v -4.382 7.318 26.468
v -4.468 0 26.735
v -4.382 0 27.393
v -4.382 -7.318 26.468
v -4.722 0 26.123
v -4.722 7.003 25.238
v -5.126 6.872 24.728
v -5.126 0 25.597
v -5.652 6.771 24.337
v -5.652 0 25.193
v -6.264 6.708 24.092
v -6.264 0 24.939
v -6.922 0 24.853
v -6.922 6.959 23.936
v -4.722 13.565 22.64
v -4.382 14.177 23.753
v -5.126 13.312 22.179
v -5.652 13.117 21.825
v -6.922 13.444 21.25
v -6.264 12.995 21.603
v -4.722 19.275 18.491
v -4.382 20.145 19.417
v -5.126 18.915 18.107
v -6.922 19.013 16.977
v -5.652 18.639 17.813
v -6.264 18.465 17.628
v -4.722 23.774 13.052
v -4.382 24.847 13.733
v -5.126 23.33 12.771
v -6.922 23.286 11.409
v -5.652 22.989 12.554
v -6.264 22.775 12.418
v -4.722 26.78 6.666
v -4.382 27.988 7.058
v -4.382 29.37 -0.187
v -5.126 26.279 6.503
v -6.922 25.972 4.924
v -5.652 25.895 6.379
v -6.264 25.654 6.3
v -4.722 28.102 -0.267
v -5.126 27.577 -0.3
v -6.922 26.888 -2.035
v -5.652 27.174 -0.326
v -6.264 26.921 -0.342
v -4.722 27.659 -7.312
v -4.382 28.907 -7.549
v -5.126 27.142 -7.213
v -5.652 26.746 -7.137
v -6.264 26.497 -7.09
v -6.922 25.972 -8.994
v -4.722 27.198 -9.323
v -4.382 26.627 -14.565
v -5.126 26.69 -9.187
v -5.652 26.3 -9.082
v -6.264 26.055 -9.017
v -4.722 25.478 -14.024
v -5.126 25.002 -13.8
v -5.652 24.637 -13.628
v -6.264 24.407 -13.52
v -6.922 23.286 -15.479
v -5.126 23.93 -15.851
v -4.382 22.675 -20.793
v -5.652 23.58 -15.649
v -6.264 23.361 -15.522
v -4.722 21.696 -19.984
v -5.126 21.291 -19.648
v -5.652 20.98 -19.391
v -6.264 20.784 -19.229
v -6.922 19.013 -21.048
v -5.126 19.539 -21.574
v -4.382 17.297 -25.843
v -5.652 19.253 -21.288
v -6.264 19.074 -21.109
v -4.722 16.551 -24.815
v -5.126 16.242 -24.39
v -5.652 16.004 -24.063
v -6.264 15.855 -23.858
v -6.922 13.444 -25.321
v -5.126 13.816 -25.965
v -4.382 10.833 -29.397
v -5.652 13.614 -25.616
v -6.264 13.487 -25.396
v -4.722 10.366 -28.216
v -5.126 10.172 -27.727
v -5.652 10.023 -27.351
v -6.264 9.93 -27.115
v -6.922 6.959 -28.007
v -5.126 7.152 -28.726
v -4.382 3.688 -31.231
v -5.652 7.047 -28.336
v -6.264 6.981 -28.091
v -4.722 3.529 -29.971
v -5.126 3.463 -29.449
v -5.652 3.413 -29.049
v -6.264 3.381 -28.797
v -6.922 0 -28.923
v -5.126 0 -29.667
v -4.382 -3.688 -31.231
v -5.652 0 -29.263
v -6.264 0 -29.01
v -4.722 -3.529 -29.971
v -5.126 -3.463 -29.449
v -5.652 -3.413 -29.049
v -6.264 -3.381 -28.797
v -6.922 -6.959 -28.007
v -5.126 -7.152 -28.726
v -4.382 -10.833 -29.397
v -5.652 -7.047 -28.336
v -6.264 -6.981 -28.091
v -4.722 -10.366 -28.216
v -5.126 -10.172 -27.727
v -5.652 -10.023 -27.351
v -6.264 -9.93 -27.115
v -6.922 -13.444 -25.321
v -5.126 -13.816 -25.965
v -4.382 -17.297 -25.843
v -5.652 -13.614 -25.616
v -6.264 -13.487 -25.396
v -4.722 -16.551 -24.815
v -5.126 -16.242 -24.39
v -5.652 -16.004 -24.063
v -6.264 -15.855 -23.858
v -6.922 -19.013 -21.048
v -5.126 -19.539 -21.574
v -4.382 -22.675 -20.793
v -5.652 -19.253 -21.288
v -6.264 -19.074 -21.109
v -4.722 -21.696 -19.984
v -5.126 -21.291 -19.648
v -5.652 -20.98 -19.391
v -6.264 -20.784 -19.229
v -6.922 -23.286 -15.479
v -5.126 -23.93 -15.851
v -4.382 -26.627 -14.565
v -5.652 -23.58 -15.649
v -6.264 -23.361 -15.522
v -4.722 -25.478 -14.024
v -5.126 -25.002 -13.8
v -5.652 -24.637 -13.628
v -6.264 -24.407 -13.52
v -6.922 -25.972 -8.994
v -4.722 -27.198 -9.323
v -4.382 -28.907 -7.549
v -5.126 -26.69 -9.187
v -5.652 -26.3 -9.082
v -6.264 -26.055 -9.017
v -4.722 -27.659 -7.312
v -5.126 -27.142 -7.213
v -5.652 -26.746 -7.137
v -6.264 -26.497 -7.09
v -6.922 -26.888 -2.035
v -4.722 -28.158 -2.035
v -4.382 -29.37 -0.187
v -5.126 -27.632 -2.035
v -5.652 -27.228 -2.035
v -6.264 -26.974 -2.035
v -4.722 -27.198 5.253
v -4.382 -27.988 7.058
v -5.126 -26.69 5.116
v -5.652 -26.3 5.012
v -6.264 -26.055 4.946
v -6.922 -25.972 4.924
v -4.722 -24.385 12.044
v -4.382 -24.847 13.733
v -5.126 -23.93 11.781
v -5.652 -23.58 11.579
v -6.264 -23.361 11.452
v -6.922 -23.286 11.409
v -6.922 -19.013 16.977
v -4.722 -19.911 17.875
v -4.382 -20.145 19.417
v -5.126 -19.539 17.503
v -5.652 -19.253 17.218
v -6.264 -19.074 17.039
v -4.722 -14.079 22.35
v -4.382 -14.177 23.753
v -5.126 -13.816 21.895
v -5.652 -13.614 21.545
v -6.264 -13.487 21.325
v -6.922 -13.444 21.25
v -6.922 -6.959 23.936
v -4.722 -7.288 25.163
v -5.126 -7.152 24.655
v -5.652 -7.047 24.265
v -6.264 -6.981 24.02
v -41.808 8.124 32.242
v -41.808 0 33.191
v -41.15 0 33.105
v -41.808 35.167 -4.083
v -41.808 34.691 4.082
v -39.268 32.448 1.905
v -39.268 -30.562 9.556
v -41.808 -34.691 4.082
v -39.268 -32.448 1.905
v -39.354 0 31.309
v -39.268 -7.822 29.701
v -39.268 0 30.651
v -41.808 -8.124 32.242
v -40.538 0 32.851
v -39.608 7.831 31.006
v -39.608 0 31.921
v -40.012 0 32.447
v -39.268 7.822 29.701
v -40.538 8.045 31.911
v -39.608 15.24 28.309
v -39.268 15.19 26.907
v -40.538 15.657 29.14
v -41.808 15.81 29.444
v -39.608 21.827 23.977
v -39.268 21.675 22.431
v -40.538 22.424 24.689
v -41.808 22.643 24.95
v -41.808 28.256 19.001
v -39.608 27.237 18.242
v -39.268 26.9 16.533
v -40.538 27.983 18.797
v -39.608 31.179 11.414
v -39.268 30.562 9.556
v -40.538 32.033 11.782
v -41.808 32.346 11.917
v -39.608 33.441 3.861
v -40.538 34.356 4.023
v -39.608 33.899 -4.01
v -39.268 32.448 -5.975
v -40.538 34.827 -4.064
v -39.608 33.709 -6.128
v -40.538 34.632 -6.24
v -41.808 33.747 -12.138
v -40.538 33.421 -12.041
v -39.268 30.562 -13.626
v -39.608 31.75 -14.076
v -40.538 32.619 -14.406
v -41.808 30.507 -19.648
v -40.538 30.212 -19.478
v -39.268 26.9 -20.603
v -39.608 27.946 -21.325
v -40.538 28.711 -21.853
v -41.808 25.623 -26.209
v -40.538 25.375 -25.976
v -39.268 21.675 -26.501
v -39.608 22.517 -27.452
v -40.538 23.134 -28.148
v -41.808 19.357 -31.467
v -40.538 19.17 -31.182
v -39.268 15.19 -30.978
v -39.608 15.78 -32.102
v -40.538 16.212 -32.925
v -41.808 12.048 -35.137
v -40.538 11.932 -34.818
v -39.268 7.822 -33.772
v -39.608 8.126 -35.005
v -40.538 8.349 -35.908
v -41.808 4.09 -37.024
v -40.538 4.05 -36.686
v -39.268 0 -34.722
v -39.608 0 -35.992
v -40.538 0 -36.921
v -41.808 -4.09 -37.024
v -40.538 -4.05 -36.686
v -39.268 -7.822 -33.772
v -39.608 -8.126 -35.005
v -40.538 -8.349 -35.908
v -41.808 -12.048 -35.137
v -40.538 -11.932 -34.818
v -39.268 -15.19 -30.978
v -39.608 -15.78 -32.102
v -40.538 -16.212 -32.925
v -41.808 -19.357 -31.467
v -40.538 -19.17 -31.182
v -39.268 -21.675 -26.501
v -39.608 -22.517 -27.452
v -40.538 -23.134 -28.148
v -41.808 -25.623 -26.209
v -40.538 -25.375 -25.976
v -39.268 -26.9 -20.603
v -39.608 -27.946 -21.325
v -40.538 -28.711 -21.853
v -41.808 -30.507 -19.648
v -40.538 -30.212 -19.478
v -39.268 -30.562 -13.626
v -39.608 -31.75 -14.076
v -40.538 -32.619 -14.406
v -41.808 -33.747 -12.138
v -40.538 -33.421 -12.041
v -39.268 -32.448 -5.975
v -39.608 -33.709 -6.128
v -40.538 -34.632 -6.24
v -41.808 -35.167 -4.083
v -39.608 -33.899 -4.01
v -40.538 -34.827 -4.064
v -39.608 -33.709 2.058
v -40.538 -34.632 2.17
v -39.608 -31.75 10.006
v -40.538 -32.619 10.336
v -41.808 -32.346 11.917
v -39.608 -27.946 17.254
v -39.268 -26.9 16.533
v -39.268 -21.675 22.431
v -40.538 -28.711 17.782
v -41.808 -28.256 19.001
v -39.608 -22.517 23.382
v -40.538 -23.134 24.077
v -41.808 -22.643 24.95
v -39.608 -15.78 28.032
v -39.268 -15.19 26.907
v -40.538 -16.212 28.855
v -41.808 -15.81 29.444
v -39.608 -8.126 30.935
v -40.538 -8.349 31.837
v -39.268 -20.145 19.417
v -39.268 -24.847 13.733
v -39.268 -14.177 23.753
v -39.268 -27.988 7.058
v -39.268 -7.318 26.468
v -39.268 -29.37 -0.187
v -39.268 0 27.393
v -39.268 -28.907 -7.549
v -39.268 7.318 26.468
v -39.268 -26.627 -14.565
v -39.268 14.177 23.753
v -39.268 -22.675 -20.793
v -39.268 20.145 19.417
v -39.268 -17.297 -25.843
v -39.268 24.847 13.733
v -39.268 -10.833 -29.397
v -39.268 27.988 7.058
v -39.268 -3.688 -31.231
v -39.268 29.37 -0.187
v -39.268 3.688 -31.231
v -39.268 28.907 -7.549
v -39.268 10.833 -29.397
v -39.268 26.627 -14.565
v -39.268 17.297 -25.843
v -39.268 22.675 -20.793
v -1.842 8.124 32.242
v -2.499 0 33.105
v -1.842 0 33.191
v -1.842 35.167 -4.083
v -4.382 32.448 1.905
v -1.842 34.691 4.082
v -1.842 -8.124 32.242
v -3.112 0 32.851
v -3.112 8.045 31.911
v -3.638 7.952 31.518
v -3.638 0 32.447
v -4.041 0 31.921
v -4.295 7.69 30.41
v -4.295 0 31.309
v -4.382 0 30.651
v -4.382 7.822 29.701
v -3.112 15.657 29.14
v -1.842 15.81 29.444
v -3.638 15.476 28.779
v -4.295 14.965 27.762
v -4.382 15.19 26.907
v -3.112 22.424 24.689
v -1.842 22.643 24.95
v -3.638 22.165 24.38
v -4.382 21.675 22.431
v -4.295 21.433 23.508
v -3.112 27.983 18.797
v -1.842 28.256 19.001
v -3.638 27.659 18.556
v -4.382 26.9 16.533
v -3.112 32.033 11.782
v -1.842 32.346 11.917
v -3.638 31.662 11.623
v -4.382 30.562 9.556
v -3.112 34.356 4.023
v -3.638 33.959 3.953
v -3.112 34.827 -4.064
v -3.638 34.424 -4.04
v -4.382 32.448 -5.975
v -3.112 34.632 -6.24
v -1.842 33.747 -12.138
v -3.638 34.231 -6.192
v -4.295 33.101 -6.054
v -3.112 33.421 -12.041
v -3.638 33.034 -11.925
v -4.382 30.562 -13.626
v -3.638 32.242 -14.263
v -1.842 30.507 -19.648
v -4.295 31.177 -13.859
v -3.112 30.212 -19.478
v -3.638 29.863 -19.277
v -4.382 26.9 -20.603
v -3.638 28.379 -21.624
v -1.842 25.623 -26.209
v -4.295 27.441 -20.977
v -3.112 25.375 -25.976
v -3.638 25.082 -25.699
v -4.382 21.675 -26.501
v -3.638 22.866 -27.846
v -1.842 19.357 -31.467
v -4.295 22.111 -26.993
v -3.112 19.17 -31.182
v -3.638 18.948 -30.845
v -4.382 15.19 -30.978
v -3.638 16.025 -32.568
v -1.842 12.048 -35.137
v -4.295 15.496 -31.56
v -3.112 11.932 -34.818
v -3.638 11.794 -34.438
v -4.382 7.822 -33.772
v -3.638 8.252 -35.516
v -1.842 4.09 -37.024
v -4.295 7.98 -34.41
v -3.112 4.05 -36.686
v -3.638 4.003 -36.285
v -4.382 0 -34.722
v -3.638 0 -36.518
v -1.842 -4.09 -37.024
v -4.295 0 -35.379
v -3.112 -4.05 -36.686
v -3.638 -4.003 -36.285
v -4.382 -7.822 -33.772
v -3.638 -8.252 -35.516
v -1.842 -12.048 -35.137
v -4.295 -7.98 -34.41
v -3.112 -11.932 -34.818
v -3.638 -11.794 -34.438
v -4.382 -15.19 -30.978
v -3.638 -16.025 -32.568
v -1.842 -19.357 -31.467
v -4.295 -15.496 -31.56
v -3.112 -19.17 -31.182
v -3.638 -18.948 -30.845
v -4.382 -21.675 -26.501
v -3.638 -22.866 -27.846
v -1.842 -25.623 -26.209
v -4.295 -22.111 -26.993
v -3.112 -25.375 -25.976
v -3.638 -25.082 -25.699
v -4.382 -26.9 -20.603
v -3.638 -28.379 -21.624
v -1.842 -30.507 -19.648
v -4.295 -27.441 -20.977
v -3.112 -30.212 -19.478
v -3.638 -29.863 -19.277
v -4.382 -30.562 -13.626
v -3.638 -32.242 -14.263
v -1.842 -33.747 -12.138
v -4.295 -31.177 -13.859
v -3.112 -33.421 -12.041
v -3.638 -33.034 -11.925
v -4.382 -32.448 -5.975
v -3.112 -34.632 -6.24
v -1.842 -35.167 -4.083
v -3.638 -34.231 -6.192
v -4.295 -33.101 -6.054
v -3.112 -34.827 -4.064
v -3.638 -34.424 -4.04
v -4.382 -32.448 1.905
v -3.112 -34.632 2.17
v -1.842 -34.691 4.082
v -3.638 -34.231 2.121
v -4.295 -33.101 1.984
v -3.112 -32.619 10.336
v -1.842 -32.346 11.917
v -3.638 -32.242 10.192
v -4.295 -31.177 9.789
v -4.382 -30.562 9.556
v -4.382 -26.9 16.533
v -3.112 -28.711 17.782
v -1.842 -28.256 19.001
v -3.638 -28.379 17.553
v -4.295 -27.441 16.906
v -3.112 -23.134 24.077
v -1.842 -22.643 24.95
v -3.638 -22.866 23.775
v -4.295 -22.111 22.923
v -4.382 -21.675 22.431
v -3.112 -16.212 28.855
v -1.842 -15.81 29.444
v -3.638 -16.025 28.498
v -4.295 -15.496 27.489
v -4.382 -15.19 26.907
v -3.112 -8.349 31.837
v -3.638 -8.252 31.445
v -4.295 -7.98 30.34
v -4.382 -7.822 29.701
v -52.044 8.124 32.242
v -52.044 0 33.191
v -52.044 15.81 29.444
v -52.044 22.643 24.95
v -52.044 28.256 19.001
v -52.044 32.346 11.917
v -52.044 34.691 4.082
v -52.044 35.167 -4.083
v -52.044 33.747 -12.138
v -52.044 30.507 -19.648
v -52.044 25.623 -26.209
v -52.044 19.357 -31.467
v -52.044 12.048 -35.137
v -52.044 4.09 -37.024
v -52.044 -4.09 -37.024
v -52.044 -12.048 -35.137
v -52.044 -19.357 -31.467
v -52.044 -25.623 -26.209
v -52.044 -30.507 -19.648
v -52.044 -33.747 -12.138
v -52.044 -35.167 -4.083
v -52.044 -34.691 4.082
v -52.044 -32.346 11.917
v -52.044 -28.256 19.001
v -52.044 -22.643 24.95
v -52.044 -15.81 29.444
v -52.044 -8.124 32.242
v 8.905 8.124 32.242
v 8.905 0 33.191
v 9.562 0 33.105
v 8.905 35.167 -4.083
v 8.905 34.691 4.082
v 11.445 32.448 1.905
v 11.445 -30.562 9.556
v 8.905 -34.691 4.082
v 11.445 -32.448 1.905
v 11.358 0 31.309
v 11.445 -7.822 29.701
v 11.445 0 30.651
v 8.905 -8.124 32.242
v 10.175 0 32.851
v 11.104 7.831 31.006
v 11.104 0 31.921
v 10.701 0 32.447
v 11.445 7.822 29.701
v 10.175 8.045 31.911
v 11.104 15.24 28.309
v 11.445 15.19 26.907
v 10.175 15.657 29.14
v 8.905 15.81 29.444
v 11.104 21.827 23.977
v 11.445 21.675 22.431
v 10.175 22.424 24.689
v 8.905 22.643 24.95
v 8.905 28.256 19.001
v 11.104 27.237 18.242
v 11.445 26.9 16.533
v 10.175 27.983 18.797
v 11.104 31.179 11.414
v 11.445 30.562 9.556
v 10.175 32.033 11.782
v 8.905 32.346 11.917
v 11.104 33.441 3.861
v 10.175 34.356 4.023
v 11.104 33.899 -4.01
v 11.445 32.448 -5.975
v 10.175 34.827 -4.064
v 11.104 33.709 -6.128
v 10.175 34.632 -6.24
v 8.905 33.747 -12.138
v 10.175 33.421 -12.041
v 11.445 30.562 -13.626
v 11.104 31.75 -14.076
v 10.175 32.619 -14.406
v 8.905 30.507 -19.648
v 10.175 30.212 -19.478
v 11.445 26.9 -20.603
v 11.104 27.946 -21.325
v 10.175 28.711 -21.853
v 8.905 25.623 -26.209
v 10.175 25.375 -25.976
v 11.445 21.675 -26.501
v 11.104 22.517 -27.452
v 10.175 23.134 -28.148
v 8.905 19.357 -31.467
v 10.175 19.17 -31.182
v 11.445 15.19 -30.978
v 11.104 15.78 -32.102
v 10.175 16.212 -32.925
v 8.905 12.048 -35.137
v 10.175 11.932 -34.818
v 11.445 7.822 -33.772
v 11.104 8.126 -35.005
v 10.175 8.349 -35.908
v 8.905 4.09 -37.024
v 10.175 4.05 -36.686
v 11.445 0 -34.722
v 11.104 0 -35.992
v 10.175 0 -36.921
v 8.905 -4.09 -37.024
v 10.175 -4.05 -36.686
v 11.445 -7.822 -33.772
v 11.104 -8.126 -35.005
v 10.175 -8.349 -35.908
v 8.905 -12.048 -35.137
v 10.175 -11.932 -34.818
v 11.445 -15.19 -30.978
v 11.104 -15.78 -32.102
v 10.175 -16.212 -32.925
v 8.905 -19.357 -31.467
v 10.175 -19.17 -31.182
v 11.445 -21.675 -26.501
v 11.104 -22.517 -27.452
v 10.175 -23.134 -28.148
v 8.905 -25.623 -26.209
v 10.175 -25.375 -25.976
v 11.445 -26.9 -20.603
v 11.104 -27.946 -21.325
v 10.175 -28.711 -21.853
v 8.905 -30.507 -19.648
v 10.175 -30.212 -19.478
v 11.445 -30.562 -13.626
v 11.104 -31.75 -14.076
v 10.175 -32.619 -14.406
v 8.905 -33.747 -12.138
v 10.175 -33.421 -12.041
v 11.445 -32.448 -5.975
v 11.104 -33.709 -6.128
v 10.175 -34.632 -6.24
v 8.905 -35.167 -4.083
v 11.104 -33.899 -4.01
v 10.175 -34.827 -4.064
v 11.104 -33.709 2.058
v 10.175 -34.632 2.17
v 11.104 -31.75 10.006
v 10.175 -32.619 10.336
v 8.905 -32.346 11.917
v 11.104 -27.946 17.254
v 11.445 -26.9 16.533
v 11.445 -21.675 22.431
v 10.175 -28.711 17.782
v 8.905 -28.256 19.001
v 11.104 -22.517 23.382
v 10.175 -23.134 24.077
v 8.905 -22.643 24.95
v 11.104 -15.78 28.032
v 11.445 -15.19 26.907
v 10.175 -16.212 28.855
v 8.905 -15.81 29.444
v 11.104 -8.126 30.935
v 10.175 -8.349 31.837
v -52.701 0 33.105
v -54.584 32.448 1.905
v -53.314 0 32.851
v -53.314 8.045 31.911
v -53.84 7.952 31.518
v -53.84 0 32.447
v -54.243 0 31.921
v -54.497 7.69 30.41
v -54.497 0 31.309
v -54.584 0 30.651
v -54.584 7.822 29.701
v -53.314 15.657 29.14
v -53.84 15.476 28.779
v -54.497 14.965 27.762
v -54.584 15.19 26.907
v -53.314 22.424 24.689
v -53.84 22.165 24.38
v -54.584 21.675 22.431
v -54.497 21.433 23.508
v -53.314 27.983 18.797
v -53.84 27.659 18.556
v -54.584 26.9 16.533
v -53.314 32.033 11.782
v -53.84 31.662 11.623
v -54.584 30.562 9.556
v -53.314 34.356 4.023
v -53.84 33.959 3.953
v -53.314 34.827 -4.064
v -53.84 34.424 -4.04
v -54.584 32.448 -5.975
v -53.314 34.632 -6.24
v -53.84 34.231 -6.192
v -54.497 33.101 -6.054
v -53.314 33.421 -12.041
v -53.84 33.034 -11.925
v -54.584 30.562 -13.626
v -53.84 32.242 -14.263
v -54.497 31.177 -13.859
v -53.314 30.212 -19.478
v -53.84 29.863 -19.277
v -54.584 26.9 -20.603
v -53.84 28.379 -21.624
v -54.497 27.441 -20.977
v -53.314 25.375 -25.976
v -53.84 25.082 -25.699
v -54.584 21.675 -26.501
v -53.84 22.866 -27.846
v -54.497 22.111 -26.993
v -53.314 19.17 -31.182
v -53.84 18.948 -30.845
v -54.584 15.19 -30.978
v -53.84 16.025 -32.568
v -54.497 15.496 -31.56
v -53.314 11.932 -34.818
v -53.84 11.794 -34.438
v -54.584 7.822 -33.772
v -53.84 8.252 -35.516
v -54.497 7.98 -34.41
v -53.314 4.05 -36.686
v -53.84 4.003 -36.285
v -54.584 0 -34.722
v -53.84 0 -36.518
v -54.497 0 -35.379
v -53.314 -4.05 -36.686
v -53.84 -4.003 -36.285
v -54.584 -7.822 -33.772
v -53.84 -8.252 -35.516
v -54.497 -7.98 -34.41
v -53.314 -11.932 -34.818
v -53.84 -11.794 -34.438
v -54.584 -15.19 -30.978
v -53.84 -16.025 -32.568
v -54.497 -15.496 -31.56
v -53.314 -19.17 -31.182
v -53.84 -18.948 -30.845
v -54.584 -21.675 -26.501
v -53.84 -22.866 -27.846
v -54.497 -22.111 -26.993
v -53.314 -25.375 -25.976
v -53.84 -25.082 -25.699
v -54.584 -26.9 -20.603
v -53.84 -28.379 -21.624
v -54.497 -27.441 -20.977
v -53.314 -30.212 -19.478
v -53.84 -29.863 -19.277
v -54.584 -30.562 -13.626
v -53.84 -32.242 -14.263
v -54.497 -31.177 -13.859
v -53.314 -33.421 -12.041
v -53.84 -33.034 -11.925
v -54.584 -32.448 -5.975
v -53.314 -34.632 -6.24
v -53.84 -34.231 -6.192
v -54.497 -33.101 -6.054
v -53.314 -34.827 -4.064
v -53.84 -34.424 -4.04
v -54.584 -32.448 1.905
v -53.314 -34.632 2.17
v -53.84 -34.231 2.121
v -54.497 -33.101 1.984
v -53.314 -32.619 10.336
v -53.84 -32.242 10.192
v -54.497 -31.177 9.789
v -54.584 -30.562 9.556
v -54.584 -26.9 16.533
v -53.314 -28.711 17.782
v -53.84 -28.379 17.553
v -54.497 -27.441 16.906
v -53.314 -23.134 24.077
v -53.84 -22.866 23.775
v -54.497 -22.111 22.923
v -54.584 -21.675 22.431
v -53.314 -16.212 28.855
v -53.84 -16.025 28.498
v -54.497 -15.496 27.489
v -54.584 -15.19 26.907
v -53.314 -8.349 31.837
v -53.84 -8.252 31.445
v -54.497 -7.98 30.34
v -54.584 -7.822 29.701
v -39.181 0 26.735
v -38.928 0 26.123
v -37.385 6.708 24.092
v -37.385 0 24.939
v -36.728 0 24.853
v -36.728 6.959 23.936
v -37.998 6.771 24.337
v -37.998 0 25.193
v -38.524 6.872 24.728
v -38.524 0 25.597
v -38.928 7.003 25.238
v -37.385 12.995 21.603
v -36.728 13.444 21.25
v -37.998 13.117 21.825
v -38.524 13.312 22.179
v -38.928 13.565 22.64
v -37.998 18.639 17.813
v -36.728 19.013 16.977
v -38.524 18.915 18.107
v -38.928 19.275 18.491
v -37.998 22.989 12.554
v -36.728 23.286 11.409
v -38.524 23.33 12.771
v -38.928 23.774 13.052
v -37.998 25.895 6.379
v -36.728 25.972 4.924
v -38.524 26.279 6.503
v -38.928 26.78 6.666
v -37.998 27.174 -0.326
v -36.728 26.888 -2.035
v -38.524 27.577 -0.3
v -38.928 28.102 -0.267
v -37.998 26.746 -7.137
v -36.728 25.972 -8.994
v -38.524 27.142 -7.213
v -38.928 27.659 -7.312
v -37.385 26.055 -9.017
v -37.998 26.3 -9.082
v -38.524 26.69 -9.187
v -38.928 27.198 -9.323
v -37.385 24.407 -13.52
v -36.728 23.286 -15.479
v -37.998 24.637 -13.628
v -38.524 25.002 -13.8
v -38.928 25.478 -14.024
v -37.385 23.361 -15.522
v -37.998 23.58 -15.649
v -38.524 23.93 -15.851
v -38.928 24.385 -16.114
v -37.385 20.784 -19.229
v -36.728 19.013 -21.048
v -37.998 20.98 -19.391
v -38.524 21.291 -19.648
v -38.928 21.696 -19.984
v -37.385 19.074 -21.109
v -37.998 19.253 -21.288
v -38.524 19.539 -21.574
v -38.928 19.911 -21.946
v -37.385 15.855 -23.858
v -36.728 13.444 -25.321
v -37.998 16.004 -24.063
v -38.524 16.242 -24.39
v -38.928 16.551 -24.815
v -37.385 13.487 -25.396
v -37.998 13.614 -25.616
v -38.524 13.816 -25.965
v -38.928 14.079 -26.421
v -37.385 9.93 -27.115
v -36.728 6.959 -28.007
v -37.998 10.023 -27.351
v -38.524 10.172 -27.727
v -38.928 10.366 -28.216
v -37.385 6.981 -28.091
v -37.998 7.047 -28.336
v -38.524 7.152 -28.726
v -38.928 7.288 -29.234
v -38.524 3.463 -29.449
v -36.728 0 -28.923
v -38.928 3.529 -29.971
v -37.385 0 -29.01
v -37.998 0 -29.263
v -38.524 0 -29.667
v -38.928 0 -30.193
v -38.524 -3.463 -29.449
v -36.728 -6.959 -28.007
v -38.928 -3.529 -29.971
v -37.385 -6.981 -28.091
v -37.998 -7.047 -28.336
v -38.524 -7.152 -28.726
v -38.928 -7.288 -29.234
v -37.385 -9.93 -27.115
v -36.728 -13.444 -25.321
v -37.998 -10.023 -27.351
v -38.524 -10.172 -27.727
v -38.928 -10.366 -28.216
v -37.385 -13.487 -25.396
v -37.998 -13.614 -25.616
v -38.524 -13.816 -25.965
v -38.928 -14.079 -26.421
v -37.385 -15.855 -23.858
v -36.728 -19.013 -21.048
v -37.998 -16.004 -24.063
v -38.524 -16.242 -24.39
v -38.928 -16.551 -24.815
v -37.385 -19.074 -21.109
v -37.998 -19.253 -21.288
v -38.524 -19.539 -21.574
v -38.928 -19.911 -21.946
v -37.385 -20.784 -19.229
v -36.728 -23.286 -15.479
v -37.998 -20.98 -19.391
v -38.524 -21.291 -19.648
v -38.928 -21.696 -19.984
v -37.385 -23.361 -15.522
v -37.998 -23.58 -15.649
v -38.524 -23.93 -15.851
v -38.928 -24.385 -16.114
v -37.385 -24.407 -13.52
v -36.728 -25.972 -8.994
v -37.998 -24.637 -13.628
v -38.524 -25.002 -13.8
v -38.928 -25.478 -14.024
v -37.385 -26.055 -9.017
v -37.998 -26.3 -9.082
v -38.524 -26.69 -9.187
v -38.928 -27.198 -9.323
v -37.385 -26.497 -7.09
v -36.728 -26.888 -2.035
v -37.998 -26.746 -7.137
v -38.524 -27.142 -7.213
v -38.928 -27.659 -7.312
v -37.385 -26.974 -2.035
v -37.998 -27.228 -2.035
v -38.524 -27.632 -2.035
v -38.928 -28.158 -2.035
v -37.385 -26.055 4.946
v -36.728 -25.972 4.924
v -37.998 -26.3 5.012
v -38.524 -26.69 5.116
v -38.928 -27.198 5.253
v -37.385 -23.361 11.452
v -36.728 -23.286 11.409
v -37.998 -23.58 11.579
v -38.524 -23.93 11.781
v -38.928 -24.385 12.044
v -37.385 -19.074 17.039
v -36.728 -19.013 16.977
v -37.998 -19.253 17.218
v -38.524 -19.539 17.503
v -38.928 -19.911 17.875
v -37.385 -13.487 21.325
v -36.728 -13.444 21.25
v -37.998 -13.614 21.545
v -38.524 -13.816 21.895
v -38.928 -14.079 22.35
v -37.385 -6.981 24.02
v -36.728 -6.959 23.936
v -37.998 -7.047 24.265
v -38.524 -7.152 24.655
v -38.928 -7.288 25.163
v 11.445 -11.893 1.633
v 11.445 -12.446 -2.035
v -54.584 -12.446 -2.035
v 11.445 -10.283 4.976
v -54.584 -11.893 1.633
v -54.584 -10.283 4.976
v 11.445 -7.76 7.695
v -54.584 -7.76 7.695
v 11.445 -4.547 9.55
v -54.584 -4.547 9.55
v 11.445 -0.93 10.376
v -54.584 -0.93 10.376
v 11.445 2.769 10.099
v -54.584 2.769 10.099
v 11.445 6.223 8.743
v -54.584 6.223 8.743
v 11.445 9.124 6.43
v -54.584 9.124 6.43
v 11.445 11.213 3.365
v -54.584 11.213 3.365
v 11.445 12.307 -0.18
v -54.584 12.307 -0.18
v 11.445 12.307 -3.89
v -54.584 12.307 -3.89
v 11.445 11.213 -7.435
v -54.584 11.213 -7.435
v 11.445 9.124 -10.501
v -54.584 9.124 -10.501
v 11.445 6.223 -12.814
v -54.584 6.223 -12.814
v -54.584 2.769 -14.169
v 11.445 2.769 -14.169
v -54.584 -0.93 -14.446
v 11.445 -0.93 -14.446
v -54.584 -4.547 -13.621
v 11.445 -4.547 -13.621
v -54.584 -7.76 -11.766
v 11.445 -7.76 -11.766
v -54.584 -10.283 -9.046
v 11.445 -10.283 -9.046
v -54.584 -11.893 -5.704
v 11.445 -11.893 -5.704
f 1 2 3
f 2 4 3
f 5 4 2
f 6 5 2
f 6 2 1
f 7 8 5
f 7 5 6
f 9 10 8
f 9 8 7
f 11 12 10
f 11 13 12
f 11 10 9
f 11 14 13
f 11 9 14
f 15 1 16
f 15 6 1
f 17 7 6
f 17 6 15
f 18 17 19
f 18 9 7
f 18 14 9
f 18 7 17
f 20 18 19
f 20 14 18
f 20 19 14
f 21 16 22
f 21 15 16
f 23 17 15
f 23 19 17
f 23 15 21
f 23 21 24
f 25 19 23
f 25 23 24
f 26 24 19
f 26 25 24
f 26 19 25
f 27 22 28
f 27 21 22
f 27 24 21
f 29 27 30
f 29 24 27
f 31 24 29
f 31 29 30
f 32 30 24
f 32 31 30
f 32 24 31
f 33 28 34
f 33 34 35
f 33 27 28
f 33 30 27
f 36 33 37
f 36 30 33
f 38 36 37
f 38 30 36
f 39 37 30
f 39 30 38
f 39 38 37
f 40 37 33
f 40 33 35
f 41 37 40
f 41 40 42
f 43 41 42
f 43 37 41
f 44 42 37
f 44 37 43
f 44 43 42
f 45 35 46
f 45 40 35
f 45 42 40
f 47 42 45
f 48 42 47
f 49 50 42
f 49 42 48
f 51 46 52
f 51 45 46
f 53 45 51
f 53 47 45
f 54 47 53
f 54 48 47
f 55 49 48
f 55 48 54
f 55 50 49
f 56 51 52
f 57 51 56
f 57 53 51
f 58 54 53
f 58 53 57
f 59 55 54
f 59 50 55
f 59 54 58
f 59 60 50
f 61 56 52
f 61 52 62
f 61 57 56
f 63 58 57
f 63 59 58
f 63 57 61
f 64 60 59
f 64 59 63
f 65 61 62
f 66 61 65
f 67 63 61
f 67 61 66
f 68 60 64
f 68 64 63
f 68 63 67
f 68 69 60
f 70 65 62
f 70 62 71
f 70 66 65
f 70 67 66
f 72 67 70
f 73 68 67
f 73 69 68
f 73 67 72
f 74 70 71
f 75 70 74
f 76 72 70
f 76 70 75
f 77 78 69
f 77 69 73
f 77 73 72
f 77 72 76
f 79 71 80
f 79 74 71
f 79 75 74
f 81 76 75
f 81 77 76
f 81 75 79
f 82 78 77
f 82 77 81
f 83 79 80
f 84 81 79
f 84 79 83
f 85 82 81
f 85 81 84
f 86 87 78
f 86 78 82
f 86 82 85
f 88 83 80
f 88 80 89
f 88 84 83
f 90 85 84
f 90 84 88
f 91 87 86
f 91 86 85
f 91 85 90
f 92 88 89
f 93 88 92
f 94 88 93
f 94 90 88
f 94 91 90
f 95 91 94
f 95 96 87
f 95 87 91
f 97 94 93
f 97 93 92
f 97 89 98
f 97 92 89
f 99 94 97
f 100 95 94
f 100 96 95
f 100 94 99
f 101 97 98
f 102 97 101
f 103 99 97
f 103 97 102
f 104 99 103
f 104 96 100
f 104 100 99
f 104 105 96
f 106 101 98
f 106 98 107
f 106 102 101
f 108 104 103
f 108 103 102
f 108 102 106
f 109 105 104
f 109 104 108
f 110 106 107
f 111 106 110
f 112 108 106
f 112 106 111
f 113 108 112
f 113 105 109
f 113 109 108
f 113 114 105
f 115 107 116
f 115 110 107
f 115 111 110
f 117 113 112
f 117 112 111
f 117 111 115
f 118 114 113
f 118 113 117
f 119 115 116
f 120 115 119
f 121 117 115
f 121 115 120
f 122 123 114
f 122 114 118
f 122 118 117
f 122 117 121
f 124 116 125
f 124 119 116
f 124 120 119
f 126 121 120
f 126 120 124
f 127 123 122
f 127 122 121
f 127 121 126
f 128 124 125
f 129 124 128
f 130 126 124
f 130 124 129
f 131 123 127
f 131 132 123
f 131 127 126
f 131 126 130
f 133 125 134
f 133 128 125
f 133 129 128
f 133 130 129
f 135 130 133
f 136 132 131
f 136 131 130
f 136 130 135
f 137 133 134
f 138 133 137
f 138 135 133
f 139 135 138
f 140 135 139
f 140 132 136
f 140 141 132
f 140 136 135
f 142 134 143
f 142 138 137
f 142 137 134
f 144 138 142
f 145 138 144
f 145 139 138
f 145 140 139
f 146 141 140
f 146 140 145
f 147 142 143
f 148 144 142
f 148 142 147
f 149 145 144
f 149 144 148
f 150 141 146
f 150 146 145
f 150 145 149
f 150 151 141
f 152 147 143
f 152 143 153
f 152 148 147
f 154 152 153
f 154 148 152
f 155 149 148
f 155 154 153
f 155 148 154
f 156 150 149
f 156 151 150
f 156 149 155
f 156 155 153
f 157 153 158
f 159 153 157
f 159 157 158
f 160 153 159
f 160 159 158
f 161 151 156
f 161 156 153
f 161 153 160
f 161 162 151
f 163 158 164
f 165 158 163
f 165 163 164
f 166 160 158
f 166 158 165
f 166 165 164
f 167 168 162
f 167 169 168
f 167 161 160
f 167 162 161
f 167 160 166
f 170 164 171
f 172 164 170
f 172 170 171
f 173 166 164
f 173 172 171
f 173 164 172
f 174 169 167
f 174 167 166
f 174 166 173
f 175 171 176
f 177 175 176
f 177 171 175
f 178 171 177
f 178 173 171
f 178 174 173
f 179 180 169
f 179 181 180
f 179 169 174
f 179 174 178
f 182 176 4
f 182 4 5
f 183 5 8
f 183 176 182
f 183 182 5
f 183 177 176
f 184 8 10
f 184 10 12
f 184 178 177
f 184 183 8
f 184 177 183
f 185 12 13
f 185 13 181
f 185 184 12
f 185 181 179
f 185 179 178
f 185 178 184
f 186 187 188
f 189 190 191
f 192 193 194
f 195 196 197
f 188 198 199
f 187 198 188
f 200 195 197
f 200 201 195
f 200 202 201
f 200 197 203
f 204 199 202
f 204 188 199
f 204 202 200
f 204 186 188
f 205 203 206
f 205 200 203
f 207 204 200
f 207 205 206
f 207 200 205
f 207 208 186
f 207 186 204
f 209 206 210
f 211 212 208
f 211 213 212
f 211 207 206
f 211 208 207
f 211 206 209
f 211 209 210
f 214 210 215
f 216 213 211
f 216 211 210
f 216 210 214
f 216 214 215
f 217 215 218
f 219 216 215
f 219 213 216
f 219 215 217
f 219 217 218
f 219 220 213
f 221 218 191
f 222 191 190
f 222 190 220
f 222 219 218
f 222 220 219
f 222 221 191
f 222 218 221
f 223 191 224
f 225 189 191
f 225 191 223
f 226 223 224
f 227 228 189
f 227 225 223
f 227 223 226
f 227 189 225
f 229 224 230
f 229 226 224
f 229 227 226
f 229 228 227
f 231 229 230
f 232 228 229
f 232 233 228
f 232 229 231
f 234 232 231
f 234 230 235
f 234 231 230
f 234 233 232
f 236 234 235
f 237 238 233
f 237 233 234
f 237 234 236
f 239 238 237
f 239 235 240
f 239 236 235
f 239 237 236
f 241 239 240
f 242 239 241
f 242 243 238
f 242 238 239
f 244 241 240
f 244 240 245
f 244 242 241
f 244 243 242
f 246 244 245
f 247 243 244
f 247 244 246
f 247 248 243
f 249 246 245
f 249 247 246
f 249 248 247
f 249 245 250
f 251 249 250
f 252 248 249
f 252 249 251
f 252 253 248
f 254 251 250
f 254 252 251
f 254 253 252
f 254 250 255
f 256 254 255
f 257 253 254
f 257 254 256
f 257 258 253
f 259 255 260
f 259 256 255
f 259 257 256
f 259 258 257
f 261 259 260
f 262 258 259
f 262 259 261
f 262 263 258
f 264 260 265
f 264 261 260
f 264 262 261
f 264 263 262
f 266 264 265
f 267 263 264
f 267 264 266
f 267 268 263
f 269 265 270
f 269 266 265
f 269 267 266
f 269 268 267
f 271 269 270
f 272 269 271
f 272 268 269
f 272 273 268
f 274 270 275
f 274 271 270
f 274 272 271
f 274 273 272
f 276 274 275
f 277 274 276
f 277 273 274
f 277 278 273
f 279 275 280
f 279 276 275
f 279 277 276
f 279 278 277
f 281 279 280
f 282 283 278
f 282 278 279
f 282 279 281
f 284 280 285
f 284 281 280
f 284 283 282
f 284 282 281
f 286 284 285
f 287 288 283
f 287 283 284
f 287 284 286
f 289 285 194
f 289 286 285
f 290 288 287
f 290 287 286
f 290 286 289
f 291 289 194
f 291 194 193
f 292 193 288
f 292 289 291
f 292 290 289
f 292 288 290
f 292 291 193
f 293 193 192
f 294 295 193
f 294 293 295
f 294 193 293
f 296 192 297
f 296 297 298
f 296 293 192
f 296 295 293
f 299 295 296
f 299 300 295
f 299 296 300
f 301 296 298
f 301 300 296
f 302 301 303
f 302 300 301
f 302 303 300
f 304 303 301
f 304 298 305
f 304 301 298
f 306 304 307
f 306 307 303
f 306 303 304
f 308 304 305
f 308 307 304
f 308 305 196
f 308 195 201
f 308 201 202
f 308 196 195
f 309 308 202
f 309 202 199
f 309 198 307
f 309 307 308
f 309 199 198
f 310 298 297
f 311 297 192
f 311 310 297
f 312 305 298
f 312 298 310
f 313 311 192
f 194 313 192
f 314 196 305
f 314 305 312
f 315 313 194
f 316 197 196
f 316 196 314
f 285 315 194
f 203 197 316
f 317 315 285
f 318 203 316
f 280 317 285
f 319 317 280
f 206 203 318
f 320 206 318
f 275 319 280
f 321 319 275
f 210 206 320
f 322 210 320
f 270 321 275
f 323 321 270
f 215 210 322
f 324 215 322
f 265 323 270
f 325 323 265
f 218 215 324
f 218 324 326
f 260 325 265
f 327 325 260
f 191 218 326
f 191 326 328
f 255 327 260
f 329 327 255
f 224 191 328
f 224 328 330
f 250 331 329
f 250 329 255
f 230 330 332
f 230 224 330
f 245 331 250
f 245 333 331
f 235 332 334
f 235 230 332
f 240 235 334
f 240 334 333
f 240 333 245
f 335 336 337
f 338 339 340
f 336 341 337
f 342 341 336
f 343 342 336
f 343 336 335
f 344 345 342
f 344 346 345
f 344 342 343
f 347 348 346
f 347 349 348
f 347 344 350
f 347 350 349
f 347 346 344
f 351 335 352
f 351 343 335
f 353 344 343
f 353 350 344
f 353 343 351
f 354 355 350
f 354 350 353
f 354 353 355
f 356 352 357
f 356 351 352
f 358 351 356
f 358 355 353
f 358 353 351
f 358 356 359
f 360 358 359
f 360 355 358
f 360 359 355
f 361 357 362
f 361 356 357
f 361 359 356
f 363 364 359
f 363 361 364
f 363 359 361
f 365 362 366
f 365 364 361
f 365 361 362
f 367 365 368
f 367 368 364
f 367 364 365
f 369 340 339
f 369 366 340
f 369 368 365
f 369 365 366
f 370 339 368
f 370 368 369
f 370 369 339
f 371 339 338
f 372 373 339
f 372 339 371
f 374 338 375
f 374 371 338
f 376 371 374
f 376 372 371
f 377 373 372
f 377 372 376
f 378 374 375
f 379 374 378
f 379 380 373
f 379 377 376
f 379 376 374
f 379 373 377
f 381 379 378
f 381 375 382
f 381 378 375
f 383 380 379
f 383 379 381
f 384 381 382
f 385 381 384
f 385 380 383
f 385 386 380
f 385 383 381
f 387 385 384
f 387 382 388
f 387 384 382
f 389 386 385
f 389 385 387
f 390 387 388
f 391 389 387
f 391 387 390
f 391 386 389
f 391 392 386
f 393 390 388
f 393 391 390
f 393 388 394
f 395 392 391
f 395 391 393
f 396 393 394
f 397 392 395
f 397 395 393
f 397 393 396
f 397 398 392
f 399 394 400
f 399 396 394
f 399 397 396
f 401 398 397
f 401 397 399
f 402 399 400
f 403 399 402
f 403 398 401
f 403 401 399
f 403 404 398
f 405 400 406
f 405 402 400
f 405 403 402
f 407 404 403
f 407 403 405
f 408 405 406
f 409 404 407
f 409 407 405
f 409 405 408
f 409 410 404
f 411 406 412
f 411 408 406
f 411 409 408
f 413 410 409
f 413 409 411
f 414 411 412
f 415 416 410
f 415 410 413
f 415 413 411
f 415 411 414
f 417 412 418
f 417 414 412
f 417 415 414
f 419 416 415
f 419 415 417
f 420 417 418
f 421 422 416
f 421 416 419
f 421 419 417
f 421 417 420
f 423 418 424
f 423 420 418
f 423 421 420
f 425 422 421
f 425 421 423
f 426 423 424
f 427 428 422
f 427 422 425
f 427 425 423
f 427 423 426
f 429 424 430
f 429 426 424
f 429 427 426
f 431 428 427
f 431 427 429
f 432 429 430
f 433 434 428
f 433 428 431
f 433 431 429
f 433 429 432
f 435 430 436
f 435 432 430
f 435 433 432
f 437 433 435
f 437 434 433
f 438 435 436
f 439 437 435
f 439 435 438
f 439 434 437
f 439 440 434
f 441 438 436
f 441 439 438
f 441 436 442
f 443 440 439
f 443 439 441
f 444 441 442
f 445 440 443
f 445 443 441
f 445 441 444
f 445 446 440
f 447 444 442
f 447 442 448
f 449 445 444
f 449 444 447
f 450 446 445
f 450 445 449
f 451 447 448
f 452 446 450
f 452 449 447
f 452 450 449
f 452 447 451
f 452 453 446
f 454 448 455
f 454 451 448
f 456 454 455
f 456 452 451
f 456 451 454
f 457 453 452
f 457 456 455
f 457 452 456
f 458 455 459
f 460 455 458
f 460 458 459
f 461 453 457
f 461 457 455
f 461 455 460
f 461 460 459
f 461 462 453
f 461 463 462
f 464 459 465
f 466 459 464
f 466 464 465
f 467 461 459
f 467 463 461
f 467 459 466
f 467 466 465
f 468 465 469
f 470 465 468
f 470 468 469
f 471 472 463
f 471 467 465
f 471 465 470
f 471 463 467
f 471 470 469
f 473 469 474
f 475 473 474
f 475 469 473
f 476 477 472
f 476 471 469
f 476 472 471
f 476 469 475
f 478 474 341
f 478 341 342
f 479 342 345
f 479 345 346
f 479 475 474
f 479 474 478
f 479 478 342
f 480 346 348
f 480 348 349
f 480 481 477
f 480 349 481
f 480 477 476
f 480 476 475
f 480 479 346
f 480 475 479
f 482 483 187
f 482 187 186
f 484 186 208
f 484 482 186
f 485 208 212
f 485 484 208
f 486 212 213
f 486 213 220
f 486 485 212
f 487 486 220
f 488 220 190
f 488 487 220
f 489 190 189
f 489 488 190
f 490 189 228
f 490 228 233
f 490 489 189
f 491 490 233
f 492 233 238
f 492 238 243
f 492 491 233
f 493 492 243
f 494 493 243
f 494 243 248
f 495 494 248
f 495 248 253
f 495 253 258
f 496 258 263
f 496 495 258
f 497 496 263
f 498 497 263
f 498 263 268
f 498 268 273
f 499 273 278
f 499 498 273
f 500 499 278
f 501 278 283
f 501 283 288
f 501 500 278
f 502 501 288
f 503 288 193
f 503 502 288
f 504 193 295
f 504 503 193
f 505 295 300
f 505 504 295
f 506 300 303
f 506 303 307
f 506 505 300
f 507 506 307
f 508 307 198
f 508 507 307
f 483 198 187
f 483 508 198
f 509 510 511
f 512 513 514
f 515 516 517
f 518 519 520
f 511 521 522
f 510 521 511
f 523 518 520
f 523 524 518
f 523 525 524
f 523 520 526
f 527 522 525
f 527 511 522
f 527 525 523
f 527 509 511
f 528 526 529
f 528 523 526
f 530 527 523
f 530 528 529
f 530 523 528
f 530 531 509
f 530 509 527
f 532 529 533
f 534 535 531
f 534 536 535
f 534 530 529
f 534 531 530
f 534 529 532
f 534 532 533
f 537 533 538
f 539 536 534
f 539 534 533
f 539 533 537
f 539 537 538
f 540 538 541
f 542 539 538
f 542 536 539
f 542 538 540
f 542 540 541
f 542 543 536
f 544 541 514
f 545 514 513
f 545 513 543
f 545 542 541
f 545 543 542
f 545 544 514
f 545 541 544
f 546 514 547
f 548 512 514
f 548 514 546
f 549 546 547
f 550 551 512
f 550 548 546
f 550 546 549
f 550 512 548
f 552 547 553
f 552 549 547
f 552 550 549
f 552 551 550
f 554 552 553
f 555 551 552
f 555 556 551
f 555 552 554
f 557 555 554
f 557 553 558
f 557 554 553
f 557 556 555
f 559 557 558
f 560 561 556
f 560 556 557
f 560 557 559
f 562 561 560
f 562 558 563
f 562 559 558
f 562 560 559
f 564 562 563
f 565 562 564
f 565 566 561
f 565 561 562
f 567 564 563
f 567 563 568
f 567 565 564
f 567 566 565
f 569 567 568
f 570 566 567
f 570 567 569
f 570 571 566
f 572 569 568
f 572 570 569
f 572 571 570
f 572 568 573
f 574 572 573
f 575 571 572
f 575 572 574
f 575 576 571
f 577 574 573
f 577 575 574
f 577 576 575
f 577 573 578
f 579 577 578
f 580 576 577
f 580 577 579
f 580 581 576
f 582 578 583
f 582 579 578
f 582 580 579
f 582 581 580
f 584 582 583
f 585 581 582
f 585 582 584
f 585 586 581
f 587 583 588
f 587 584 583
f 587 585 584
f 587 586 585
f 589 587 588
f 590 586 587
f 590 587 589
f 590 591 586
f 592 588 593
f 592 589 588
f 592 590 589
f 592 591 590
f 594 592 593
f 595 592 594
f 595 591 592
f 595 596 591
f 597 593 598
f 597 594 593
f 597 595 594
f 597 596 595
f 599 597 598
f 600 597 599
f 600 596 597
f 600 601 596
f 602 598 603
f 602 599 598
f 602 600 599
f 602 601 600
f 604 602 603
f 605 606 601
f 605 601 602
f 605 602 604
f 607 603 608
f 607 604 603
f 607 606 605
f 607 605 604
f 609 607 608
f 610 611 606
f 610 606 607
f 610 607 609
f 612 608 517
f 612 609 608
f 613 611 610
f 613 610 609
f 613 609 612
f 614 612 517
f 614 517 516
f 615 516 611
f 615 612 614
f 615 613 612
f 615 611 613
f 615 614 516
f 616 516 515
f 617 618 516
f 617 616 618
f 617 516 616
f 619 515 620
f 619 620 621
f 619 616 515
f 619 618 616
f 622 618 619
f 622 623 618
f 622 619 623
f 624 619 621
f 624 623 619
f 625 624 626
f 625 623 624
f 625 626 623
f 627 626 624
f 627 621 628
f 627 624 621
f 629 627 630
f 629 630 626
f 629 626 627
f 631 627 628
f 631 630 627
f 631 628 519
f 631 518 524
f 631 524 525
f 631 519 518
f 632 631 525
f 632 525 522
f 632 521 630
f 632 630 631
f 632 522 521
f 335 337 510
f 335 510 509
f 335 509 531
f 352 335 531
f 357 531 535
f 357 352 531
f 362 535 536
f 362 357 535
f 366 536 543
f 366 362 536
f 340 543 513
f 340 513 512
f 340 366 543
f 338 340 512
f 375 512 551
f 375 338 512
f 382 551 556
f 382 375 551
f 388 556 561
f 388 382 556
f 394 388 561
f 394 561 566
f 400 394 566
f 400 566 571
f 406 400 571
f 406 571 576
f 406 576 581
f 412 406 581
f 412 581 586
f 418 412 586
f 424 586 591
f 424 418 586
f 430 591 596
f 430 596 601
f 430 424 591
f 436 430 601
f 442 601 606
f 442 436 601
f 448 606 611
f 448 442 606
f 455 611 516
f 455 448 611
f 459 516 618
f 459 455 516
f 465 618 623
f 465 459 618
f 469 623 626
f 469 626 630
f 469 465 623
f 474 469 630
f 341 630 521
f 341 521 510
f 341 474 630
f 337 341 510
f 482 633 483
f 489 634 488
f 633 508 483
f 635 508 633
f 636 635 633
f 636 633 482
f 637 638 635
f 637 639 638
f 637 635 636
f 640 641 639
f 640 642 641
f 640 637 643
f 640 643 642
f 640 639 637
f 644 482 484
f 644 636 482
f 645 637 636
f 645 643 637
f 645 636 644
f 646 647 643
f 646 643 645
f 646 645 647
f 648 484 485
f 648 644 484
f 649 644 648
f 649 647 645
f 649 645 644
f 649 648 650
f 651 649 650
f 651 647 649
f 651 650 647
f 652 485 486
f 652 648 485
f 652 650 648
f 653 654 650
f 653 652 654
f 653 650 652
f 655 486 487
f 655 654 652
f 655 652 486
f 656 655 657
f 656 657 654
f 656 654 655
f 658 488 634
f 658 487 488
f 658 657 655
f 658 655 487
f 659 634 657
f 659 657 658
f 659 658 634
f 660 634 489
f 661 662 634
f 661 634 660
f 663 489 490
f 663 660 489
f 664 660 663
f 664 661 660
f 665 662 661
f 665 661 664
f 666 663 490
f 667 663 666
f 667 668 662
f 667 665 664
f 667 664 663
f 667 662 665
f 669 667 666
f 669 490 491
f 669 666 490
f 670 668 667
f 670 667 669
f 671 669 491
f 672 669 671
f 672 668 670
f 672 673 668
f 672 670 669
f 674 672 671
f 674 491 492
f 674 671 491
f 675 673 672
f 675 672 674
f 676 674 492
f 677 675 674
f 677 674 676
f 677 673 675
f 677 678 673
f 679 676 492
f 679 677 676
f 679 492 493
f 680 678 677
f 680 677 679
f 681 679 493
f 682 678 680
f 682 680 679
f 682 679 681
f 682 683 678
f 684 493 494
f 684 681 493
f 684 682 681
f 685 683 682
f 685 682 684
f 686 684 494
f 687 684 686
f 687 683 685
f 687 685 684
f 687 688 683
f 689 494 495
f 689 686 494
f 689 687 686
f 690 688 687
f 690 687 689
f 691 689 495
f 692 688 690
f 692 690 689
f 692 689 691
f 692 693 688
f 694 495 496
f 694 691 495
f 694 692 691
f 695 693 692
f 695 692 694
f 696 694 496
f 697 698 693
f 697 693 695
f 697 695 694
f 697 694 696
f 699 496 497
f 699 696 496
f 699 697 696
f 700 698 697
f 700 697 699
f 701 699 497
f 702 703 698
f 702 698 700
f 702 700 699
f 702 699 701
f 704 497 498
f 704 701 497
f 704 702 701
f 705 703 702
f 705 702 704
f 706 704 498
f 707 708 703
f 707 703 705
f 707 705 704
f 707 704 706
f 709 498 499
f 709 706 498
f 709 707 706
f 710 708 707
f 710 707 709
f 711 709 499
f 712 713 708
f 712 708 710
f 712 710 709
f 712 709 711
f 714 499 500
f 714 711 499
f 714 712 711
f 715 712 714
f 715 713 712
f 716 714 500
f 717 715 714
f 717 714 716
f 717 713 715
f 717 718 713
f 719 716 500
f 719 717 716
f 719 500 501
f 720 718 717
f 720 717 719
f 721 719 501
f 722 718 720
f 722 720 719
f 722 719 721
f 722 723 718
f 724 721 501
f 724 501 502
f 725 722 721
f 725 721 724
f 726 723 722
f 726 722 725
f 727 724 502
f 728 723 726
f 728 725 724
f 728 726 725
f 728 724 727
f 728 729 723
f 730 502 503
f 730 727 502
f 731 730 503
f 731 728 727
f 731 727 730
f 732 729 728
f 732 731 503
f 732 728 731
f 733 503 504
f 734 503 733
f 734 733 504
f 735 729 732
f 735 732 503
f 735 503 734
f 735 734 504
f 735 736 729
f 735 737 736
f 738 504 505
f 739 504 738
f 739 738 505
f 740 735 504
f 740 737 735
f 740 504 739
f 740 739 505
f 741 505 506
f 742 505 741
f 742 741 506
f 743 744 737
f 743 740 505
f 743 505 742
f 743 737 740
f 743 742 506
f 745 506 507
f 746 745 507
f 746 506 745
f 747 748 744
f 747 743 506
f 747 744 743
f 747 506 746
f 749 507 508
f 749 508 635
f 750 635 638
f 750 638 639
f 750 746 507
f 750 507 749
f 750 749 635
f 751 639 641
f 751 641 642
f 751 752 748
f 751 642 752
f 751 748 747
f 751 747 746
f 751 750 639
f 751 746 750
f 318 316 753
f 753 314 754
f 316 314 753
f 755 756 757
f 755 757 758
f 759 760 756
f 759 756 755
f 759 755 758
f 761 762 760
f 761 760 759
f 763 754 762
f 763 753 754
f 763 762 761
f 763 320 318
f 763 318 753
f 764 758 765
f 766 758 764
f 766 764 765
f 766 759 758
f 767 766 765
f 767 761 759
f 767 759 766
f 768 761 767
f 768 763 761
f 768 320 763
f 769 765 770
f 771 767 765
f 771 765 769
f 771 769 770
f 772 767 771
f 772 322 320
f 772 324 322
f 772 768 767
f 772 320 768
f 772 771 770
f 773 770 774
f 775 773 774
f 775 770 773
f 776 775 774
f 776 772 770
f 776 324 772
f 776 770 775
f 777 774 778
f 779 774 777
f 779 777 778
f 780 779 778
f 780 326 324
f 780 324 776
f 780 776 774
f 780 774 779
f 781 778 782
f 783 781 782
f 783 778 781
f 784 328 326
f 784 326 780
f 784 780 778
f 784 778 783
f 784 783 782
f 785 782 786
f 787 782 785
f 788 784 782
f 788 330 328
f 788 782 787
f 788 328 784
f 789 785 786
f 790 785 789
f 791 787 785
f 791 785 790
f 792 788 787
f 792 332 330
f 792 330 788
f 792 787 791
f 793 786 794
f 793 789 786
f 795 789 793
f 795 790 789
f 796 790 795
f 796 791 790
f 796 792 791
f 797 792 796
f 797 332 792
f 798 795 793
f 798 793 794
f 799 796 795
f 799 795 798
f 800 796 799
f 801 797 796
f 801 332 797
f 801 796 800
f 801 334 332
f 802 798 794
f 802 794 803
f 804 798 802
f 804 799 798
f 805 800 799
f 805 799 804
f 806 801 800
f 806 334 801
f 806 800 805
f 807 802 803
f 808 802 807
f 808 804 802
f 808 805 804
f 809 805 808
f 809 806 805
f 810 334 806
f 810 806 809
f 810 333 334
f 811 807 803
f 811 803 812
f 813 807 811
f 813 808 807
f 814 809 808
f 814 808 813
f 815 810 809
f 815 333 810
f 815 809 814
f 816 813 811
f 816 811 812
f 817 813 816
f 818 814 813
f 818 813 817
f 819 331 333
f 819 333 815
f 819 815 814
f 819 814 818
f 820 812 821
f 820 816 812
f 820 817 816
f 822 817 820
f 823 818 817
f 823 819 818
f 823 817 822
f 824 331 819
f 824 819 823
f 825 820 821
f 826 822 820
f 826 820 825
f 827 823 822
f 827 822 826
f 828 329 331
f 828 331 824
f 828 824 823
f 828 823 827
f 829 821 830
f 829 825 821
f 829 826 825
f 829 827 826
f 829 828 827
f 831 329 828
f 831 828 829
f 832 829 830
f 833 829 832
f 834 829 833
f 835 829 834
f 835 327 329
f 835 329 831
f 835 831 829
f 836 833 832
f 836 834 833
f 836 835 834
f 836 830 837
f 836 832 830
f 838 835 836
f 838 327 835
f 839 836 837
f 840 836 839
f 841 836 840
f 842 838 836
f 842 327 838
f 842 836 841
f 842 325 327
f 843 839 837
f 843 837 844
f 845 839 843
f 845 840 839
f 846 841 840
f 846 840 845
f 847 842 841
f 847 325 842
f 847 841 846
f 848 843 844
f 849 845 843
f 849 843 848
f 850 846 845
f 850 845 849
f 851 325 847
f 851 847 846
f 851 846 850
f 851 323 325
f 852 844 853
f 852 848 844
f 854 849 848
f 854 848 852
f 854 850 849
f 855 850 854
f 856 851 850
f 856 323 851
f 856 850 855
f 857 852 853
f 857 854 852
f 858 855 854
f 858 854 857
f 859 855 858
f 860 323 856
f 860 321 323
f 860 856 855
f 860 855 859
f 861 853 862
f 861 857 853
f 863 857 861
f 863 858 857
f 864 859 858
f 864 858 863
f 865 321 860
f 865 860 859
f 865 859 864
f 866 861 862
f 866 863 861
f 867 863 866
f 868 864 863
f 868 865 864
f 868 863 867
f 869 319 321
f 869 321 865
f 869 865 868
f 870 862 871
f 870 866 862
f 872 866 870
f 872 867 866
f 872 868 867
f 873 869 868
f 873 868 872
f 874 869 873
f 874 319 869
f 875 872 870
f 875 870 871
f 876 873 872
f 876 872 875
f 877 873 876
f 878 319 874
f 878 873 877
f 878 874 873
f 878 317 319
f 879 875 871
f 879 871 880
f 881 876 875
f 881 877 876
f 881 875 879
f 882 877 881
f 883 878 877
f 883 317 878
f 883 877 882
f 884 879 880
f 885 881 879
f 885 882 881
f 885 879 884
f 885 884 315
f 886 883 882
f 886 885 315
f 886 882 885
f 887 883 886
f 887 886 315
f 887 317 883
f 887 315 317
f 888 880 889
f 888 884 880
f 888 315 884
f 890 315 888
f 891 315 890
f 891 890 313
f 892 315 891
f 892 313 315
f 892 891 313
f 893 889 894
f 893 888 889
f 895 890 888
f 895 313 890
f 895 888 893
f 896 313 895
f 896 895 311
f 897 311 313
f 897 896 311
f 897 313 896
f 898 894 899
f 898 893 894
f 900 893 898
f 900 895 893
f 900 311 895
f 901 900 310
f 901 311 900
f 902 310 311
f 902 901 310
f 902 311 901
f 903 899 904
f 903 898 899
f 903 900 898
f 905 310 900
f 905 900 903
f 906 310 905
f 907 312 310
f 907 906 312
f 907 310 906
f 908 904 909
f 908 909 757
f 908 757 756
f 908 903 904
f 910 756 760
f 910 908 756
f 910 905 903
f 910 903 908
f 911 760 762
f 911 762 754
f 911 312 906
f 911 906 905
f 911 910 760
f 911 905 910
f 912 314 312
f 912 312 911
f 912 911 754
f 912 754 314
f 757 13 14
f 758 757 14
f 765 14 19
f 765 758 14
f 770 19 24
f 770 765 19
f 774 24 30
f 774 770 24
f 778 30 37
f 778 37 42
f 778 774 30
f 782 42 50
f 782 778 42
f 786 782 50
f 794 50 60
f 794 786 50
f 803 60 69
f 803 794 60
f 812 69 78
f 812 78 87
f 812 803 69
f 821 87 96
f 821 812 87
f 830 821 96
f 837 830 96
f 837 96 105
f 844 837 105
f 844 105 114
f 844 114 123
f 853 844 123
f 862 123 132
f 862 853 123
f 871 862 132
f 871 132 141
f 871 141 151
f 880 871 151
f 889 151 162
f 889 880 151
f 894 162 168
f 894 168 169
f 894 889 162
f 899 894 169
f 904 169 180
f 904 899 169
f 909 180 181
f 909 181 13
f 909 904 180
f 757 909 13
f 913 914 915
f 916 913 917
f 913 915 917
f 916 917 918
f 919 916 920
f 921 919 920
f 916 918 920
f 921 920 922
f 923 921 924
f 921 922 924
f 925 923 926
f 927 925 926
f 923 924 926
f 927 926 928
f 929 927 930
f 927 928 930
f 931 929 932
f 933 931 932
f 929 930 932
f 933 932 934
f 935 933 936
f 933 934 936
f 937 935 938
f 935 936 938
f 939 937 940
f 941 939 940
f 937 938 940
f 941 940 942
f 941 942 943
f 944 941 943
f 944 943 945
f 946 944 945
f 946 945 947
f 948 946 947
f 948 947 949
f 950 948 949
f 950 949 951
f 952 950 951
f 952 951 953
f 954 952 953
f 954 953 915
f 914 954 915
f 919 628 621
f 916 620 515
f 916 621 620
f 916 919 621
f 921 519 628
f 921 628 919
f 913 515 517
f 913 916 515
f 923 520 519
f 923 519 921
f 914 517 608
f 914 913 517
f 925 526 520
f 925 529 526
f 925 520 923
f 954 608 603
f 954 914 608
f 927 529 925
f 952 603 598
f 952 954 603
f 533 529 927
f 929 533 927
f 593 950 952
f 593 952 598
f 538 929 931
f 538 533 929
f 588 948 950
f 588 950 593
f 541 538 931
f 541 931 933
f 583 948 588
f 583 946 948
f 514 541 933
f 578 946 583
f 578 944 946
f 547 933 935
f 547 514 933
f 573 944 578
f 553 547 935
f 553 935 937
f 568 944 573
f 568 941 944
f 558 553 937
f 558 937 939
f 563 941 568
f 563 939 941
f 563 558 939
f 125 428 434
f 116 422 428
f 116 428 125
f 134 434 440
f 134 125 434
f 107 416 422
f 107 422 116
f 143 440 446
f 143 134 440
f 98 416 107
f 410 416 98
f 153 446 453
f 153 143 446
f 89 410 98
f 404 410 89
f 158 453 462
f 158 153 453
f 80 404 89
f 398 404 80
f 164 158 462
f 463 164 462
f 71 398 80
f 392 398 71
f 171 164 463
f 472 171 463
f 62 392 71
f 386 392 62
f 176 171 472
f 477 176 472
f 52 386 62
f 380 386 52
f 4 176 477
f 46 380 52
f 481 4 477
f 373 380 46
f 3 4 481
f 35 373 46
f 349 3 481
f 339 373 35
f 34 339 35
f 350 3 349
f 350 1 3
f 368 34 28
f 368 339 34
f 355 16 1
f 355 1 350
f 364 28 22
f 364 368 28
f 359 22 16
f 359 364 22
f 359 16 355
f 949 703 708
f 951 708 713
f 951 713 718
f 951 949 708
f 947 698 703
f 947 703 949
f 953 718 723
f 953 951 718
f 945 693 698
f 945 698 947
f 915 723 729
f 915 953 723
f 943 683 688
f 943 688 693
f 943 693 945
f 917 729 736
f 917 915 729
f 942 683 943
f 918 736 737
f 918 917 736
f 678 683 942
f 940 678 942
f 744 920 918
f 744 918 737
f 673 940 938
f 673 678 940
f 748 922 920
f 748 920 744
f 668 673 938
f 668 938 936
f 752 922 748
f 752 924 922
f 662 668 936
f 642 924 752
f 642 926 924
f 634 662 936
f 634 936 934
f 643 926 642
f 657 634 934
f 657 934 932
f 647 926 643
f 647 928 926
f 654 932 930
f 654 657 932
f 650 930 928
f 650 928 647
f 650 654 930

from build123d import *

# Parameters (mm, degrees)
F2_R     = 2.54
F4_D     = 24.892
F4_DEPTH = 101.6
F4_TIP   = 7.4783112644


with BuildPart() as f1:
    # F0 (on Front) → F1 (revolve)
    with BuildSketch(Plane.XZ):
        Polygon((-39.2678369393, 33.1912179422), (-54.5836920168, 33.1912179422), (-54.5836920168, -2.0352486931), (-39.2678369393, -2.0352486931), (-39.2678369393, 6.3033834775), (-4.3817243393, 6.3033834775), (-4.3817243393, -2.0352486931), (11.4446589973, -2.0352486931), (11.4446589973, 33.1912179422), (-4.3817243393, 33.1912179422), (-4.3817243393, 24.8525857715), (-39.2678369393, 24.8525857715), align=None)
    revolve(axis=Axis((-46.925764478, 0, -2.0352486931), (-1, 0, 0)))

    # F2
    f2_edges = [f1.edges().sort_by_distance(p)[0] for p in [
        (11.444659, 0, -37.261715),
        (-54.583692, 0, -37.261715),
        (-39.267837, 0, -37.261715),
        (-4.381724, 0, -37.261715),
        (-4.381724, 0, -28.923083),
        (-39.267837, 0, -28.923083),
    ]]
    fillet(f2_edges, radius=F2_R)

    # F4
    with Locations(Plane.YZ.offset(11.4446589973)):
        with Locations((0, -2.0352486931)):
            Hole(F4_D / 2, depth=F4_DEPTH)
            with Locations((0, 0, -(F4_DEPTH + F4_TIP / 2))):  # 118° drill point
                Cone(0, F4_D / 2, F4_TIP, mode=Mode.SUBTRACT)


solid = f1.part
